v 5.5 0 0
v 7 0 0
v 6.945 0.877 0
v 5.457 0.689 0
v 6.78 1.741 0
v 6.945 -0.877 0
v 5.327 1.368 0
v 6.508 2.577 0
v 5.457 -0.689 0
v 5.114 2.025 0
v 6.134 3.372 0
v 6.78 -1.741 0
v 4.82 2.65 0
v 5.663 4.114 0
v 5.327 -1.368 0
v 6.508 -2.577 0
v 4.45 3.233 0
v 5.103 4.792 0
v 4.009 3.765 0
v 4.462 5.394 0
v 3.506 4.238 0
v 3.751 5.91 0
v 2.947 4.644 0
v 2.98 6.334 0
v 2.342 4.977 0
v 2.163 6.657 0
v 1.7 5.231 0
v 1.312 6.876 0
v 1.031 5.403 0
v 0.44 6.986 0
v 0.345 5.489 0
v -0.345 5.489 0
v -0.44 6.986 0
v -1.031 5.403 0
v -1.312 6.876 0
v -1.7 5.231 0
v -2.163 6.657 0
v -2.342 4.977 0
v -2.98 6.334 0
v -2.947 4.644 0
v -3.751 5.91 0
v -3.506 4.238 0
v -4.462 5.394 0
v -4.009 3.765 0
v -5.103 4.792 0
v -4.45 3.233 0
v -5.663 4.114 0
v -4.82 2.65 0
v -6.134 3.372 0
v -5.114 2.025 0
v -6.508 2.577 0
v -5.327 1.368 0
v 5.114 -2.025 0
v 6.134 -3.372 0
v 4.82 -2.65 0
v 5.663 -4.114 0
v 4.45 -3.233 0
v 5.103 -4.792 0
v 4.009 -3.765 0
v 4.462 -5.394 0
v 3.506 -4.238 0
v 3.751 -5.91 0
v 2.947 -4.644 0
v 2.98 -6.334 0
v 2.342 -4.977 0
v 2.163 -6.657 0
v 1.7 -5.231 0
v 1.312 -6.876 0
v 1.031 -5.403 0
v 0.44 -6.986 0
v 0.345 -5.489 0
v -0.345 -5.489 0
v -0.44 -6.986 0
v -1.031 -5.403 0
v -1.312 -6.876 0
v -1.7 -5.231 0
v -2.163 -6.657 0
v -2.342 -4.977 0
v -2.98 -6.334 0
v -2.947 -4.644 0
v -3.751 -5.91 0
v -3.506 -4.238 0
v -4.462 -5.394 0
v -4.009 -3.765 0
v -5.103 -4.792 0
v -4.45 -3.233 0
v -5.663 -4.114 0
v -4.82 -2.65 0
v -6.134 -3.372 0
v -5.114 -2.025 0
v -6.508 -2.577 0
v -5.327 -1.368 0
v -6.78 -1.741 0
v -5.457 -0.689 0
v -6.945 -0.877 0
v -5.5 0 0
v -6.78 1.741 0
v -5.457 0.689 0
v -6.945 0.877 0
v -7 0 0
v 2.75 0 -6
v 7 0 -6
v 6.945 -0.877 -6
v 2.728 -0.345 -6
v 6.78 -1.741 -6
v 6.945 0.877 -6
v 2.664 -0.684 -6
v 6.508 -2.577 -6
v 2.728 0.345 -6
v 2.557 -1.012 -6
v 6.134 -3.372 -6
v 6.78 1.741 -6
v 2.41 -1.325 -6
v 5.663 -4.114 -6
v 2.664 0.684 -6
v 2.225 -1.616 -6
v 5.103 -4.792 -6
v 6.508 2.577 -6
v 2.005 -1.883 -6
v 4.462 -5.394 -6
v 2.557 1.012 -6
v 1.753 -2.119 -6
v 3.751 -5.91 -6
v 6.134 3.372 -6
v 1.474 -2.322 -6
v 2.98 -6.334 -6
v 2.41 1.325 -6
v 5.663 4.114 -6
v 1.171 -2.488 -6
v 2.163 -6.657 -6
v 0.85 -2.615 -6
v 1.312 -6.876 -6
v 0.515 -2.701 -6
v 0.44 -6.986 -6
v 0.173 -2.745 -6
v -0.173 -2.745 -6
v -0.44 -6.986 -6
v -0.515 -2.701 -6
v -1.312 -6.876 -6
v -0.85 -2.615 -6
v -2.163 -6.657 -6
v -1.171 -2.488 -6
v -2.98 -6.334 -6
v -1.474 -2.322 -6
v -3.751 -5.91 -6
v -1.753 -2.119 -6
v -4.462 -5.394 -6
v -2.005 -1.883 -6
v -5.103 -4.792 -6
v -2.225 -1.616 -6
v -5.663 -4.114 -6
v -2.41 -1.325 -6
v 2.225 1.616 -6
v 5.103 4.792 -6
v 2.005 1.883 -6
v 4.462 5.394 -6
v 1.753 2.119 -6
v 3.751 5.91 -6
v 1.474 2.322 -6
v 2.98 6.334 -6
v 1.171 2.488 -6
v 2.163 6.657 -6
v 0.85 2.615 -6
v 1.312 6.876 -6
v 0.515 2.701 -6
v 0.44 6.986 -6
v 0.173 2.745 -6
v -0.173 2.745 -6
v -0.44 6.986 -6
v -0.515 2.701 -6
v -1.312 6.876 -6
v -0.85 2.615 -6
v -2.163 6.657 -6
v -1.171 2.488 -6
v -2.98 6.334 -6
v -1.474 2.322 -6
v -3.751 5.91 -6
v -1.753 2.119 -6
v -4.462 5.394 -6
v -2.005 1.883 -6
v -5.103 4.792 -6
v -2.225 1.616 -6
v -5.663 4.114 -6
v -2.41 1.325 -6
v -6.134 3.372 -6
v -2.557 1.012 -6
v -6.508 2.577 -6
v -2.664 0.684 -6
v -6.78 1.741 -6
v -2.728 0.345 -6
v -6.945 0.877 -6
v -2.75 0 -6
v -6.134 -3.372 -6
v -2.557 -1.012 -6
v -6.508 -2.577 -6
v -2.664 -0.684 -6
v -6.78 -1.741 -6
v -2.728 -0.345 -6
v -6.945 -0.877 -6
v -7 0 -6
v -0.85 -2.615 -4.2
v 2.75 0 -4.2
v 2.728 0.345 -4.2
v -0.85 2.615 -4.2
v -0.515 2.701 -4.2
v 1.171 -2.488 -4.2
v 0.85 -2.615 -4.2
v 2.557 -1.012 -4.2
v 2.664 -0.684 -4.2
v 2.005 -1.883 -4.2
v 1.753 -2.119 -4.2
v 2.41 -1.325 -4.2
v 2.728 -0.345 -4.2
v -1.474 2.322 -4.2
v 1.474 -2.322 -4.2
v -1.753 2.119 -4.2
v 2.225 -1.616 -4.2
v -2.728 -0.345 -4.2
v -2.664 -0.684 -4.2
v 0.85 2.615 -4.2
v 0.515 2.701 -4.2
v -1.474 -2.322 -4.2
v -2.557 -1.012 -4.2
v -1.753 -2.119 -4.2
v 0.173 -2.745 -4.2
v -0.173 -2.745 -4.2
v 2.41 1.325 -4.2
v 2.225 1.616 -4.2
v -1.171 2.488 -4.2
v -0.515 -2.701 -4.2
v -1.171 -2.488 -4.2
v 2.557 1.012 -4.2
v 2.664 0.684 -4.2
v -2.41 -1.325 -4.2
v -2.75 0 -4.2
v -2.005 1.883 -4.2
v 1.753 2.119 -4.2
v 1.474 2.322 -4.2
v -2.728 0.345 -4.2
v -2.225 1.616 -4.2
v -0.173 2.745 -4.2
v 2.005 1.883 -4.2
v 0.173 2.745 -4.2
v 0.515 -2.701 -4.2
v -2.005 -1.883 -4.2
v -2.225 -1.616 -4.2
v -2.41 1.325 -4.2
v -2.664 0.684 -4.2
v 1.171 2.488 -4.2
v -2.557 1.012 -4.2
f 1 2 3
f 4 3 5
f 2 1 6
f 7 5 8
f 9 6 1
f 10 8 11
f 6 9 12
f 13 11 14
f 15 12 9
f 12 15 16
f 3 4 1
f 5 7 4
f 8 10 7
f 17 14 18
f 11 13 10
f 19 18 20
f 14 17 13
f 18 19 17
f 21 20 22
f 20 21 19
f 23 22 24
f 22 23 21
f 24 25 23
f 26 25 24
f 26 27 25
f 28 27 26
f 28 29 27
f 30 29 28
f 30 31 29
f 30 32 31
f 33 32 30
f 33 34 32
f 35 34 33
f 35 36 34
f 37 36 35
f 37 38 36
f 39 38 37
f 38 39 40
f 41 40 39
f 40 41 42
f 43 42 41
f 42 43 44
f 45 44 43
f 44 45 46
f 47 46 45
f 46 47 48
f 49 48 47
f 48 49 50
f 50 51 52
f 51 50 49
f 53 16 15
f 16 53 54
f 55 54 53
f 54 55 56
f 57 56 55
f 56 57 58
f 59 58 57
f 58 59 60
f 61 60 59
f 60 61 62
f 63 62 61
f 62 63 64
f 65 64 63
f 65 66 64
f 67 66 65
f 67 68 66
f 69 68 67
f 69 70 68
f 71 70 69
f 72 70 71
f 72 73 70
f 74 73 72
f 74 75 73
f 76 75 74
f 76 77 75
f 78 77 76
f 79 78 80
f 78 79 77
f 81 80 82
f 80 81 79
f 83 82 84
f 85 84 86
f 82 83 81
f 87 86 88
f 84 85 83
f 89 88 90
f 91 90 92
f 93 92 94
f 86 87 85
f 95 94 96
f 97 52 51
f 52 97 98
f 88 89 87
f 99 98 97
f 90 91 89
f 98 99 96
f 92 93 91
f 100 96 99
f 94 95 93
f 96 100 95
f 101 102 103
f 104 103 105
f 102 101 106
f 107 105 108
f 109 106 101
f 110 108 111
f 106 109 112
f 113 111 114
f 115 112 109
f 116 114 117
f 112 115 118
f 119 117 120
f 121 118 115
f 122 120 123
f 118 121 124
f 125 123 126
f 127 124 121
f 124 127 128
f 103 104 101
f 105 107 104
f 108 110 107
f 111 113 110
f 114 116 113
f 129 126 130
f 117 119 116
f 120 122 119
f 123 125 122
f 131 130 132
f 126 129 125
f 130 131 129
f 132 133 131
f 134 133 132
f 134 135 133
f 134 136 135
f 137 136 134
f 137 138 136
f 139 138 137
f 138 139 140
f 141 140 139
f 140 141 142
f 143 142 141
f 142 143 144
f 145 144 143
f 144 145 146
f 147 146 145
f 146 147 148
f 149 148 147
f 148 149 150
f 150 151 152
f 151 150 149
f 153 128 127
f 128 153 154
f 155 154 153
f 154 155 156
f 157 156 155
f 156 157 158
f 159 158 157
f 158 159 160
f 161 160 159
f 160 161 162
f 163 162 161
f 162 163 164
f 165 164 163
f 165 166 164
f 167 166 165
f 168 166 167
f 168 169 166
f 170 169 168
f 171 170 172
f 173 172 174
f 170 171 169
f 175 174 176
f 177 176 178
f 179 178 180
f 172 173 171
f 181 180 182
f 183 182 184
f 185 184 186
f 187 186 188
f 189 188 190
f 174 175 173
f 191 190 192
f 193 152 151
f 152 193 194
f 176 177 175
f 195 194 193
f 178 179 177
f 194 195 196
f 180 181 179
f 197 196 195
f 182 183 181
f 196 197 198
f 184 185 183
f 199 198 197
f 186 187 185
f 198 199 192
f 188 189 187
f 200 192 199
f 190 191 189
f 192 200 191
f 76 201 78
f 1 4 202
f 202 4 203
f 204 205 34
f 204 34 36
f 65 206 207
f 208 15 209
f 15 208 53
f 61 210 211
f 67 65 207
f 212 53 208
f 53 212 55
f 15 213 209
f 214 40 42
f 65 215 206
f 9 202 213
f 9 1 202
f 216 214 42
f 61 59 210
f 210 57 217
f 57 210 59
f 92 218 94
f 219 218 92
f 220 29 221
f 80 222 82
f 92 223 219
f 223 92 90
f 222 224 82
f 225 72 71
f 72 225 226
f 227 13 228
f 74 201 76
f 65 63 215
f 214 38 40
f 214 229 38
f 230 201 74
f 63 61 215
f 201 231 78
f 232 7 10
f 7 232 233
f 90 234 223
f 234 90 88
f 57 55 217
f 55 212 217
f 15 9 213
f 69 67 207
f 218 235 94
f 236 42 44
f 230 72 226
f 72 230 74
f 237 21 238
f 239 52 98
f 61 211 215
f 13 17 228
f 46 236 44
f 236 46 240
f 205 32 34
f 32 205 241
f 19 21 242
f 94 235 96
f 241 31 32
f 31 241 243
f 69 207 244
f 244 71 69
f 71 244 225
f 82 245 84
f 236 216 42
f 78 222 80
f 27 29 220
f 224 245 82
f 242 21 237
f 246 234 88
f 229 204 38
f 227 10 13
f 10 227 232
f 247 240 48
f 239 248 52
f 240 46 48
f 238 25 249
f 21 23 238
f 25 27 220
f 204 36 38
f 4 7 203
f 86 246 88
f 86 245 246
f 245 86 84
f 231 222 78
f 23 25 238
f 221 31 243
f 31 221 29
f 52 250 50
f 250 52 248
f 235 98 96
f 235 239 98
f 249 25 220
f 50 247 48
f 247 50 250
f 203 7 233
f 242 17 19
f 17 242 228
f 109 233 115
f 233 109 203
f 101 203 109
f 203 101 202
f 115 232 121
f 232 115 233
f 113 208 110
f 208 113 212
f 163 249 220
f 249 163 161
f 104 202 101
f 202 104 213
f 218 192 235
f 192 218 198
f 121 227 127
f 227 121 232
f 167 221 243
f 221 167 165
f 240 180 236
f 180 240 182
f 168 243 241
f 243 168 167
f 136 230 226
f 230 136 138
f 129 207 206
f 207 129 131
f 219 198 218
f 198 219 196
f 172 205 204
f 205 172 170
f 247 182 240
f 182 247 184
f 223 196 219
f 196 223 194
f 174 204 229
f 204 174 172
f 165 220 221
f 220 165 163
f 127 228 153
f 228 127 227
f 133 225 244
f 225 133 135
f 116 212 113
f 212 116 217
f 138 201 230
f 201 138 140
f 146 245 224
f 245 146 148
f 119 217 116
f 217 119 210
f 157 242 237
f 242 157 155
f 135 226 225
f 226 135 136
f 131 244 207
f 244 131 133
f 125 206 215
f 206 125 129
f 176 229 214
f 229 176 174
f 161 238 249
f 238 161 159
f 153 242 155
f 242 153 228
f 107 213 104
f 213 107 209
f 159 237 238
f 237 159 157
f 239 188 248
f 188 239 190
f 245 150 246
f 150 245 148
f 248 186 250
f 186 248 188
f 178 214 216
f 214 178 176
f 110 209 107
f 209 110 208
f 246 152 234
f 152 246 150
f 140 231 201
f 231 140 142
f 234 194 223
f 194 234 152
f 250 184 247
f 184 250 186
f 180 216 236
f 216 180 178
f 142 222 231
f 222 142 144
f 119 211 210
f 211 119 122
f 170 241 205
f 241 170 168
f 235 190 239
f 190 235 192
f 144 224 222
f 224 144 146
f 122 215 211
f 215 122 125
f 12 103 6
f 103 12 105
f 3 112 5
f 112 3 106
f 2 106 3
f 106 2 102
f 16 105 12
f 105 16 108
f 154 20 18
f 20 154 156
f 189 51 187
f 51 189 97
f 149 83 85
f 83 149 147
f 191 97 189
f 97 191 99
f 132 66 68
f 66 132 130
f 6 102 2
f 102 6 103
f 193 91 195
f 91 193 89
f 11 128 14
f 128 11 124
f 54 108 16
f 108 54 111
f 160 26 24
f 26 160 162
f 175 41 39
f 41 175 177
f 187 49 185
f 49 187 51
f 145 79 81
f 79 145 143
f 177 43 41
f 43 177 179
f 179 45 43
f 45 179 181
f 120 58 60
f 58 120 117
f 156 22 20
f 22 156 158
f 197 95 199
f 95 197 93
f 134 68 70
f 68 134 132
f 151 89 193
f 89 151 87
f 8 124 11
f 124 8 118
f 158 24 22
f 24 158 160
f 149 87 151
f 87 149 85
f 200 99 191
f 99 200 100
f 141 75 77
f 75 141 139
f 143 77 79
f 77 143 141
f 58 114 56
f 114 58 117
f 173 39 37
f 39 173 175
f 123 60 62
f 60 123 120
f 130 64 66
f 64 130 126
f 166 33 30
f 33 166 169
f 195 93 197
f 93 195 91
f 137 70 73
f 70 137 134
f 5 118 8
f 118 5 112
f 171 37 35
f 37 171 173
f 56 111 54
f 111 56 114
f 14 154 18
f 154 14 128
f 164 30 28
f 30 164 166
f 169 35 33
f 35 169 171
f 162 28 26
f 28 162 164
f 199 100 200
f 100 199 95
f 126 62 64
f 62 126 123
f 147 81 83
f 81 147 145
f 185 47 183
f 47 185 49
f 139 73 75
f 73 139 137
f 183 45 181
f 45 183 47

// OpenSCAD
$fn = 50;


difference() {
	union() {
		translate(v = [0, 0, -6.0000000000]) {
			cylinder(h = 6, r = 7.0000000000);
		}
		cylinder(h = 0, r = 16.0000000000);
	}
	union() {
		translate(v = [0, 0, 0]) {
			rotate(a = [0, 0, 0]) {
				difference() {
					union() {
						#translate(v = [0, 0, -6.0000000000]) {
							cylinder(h = 6, r = 2.2500000000);
						}
						#translate(v = [0, 0, -4.2000000000]) {
							cylinder(h = 4.2000000000, r1 = 2.7500000000, r2 = 5.5000000000);
						}
						#translate(v = [0, 0, -6.0000000000]) {
							cylinder(h = 6, r = 2.7500000000);
						}
						#translate(v = [0, 0, -6.0000000000]) {
							cylinder(h = 6, r = 2.2500000000);
						}
					}
					union();
				}
			}
		}
	}
}
